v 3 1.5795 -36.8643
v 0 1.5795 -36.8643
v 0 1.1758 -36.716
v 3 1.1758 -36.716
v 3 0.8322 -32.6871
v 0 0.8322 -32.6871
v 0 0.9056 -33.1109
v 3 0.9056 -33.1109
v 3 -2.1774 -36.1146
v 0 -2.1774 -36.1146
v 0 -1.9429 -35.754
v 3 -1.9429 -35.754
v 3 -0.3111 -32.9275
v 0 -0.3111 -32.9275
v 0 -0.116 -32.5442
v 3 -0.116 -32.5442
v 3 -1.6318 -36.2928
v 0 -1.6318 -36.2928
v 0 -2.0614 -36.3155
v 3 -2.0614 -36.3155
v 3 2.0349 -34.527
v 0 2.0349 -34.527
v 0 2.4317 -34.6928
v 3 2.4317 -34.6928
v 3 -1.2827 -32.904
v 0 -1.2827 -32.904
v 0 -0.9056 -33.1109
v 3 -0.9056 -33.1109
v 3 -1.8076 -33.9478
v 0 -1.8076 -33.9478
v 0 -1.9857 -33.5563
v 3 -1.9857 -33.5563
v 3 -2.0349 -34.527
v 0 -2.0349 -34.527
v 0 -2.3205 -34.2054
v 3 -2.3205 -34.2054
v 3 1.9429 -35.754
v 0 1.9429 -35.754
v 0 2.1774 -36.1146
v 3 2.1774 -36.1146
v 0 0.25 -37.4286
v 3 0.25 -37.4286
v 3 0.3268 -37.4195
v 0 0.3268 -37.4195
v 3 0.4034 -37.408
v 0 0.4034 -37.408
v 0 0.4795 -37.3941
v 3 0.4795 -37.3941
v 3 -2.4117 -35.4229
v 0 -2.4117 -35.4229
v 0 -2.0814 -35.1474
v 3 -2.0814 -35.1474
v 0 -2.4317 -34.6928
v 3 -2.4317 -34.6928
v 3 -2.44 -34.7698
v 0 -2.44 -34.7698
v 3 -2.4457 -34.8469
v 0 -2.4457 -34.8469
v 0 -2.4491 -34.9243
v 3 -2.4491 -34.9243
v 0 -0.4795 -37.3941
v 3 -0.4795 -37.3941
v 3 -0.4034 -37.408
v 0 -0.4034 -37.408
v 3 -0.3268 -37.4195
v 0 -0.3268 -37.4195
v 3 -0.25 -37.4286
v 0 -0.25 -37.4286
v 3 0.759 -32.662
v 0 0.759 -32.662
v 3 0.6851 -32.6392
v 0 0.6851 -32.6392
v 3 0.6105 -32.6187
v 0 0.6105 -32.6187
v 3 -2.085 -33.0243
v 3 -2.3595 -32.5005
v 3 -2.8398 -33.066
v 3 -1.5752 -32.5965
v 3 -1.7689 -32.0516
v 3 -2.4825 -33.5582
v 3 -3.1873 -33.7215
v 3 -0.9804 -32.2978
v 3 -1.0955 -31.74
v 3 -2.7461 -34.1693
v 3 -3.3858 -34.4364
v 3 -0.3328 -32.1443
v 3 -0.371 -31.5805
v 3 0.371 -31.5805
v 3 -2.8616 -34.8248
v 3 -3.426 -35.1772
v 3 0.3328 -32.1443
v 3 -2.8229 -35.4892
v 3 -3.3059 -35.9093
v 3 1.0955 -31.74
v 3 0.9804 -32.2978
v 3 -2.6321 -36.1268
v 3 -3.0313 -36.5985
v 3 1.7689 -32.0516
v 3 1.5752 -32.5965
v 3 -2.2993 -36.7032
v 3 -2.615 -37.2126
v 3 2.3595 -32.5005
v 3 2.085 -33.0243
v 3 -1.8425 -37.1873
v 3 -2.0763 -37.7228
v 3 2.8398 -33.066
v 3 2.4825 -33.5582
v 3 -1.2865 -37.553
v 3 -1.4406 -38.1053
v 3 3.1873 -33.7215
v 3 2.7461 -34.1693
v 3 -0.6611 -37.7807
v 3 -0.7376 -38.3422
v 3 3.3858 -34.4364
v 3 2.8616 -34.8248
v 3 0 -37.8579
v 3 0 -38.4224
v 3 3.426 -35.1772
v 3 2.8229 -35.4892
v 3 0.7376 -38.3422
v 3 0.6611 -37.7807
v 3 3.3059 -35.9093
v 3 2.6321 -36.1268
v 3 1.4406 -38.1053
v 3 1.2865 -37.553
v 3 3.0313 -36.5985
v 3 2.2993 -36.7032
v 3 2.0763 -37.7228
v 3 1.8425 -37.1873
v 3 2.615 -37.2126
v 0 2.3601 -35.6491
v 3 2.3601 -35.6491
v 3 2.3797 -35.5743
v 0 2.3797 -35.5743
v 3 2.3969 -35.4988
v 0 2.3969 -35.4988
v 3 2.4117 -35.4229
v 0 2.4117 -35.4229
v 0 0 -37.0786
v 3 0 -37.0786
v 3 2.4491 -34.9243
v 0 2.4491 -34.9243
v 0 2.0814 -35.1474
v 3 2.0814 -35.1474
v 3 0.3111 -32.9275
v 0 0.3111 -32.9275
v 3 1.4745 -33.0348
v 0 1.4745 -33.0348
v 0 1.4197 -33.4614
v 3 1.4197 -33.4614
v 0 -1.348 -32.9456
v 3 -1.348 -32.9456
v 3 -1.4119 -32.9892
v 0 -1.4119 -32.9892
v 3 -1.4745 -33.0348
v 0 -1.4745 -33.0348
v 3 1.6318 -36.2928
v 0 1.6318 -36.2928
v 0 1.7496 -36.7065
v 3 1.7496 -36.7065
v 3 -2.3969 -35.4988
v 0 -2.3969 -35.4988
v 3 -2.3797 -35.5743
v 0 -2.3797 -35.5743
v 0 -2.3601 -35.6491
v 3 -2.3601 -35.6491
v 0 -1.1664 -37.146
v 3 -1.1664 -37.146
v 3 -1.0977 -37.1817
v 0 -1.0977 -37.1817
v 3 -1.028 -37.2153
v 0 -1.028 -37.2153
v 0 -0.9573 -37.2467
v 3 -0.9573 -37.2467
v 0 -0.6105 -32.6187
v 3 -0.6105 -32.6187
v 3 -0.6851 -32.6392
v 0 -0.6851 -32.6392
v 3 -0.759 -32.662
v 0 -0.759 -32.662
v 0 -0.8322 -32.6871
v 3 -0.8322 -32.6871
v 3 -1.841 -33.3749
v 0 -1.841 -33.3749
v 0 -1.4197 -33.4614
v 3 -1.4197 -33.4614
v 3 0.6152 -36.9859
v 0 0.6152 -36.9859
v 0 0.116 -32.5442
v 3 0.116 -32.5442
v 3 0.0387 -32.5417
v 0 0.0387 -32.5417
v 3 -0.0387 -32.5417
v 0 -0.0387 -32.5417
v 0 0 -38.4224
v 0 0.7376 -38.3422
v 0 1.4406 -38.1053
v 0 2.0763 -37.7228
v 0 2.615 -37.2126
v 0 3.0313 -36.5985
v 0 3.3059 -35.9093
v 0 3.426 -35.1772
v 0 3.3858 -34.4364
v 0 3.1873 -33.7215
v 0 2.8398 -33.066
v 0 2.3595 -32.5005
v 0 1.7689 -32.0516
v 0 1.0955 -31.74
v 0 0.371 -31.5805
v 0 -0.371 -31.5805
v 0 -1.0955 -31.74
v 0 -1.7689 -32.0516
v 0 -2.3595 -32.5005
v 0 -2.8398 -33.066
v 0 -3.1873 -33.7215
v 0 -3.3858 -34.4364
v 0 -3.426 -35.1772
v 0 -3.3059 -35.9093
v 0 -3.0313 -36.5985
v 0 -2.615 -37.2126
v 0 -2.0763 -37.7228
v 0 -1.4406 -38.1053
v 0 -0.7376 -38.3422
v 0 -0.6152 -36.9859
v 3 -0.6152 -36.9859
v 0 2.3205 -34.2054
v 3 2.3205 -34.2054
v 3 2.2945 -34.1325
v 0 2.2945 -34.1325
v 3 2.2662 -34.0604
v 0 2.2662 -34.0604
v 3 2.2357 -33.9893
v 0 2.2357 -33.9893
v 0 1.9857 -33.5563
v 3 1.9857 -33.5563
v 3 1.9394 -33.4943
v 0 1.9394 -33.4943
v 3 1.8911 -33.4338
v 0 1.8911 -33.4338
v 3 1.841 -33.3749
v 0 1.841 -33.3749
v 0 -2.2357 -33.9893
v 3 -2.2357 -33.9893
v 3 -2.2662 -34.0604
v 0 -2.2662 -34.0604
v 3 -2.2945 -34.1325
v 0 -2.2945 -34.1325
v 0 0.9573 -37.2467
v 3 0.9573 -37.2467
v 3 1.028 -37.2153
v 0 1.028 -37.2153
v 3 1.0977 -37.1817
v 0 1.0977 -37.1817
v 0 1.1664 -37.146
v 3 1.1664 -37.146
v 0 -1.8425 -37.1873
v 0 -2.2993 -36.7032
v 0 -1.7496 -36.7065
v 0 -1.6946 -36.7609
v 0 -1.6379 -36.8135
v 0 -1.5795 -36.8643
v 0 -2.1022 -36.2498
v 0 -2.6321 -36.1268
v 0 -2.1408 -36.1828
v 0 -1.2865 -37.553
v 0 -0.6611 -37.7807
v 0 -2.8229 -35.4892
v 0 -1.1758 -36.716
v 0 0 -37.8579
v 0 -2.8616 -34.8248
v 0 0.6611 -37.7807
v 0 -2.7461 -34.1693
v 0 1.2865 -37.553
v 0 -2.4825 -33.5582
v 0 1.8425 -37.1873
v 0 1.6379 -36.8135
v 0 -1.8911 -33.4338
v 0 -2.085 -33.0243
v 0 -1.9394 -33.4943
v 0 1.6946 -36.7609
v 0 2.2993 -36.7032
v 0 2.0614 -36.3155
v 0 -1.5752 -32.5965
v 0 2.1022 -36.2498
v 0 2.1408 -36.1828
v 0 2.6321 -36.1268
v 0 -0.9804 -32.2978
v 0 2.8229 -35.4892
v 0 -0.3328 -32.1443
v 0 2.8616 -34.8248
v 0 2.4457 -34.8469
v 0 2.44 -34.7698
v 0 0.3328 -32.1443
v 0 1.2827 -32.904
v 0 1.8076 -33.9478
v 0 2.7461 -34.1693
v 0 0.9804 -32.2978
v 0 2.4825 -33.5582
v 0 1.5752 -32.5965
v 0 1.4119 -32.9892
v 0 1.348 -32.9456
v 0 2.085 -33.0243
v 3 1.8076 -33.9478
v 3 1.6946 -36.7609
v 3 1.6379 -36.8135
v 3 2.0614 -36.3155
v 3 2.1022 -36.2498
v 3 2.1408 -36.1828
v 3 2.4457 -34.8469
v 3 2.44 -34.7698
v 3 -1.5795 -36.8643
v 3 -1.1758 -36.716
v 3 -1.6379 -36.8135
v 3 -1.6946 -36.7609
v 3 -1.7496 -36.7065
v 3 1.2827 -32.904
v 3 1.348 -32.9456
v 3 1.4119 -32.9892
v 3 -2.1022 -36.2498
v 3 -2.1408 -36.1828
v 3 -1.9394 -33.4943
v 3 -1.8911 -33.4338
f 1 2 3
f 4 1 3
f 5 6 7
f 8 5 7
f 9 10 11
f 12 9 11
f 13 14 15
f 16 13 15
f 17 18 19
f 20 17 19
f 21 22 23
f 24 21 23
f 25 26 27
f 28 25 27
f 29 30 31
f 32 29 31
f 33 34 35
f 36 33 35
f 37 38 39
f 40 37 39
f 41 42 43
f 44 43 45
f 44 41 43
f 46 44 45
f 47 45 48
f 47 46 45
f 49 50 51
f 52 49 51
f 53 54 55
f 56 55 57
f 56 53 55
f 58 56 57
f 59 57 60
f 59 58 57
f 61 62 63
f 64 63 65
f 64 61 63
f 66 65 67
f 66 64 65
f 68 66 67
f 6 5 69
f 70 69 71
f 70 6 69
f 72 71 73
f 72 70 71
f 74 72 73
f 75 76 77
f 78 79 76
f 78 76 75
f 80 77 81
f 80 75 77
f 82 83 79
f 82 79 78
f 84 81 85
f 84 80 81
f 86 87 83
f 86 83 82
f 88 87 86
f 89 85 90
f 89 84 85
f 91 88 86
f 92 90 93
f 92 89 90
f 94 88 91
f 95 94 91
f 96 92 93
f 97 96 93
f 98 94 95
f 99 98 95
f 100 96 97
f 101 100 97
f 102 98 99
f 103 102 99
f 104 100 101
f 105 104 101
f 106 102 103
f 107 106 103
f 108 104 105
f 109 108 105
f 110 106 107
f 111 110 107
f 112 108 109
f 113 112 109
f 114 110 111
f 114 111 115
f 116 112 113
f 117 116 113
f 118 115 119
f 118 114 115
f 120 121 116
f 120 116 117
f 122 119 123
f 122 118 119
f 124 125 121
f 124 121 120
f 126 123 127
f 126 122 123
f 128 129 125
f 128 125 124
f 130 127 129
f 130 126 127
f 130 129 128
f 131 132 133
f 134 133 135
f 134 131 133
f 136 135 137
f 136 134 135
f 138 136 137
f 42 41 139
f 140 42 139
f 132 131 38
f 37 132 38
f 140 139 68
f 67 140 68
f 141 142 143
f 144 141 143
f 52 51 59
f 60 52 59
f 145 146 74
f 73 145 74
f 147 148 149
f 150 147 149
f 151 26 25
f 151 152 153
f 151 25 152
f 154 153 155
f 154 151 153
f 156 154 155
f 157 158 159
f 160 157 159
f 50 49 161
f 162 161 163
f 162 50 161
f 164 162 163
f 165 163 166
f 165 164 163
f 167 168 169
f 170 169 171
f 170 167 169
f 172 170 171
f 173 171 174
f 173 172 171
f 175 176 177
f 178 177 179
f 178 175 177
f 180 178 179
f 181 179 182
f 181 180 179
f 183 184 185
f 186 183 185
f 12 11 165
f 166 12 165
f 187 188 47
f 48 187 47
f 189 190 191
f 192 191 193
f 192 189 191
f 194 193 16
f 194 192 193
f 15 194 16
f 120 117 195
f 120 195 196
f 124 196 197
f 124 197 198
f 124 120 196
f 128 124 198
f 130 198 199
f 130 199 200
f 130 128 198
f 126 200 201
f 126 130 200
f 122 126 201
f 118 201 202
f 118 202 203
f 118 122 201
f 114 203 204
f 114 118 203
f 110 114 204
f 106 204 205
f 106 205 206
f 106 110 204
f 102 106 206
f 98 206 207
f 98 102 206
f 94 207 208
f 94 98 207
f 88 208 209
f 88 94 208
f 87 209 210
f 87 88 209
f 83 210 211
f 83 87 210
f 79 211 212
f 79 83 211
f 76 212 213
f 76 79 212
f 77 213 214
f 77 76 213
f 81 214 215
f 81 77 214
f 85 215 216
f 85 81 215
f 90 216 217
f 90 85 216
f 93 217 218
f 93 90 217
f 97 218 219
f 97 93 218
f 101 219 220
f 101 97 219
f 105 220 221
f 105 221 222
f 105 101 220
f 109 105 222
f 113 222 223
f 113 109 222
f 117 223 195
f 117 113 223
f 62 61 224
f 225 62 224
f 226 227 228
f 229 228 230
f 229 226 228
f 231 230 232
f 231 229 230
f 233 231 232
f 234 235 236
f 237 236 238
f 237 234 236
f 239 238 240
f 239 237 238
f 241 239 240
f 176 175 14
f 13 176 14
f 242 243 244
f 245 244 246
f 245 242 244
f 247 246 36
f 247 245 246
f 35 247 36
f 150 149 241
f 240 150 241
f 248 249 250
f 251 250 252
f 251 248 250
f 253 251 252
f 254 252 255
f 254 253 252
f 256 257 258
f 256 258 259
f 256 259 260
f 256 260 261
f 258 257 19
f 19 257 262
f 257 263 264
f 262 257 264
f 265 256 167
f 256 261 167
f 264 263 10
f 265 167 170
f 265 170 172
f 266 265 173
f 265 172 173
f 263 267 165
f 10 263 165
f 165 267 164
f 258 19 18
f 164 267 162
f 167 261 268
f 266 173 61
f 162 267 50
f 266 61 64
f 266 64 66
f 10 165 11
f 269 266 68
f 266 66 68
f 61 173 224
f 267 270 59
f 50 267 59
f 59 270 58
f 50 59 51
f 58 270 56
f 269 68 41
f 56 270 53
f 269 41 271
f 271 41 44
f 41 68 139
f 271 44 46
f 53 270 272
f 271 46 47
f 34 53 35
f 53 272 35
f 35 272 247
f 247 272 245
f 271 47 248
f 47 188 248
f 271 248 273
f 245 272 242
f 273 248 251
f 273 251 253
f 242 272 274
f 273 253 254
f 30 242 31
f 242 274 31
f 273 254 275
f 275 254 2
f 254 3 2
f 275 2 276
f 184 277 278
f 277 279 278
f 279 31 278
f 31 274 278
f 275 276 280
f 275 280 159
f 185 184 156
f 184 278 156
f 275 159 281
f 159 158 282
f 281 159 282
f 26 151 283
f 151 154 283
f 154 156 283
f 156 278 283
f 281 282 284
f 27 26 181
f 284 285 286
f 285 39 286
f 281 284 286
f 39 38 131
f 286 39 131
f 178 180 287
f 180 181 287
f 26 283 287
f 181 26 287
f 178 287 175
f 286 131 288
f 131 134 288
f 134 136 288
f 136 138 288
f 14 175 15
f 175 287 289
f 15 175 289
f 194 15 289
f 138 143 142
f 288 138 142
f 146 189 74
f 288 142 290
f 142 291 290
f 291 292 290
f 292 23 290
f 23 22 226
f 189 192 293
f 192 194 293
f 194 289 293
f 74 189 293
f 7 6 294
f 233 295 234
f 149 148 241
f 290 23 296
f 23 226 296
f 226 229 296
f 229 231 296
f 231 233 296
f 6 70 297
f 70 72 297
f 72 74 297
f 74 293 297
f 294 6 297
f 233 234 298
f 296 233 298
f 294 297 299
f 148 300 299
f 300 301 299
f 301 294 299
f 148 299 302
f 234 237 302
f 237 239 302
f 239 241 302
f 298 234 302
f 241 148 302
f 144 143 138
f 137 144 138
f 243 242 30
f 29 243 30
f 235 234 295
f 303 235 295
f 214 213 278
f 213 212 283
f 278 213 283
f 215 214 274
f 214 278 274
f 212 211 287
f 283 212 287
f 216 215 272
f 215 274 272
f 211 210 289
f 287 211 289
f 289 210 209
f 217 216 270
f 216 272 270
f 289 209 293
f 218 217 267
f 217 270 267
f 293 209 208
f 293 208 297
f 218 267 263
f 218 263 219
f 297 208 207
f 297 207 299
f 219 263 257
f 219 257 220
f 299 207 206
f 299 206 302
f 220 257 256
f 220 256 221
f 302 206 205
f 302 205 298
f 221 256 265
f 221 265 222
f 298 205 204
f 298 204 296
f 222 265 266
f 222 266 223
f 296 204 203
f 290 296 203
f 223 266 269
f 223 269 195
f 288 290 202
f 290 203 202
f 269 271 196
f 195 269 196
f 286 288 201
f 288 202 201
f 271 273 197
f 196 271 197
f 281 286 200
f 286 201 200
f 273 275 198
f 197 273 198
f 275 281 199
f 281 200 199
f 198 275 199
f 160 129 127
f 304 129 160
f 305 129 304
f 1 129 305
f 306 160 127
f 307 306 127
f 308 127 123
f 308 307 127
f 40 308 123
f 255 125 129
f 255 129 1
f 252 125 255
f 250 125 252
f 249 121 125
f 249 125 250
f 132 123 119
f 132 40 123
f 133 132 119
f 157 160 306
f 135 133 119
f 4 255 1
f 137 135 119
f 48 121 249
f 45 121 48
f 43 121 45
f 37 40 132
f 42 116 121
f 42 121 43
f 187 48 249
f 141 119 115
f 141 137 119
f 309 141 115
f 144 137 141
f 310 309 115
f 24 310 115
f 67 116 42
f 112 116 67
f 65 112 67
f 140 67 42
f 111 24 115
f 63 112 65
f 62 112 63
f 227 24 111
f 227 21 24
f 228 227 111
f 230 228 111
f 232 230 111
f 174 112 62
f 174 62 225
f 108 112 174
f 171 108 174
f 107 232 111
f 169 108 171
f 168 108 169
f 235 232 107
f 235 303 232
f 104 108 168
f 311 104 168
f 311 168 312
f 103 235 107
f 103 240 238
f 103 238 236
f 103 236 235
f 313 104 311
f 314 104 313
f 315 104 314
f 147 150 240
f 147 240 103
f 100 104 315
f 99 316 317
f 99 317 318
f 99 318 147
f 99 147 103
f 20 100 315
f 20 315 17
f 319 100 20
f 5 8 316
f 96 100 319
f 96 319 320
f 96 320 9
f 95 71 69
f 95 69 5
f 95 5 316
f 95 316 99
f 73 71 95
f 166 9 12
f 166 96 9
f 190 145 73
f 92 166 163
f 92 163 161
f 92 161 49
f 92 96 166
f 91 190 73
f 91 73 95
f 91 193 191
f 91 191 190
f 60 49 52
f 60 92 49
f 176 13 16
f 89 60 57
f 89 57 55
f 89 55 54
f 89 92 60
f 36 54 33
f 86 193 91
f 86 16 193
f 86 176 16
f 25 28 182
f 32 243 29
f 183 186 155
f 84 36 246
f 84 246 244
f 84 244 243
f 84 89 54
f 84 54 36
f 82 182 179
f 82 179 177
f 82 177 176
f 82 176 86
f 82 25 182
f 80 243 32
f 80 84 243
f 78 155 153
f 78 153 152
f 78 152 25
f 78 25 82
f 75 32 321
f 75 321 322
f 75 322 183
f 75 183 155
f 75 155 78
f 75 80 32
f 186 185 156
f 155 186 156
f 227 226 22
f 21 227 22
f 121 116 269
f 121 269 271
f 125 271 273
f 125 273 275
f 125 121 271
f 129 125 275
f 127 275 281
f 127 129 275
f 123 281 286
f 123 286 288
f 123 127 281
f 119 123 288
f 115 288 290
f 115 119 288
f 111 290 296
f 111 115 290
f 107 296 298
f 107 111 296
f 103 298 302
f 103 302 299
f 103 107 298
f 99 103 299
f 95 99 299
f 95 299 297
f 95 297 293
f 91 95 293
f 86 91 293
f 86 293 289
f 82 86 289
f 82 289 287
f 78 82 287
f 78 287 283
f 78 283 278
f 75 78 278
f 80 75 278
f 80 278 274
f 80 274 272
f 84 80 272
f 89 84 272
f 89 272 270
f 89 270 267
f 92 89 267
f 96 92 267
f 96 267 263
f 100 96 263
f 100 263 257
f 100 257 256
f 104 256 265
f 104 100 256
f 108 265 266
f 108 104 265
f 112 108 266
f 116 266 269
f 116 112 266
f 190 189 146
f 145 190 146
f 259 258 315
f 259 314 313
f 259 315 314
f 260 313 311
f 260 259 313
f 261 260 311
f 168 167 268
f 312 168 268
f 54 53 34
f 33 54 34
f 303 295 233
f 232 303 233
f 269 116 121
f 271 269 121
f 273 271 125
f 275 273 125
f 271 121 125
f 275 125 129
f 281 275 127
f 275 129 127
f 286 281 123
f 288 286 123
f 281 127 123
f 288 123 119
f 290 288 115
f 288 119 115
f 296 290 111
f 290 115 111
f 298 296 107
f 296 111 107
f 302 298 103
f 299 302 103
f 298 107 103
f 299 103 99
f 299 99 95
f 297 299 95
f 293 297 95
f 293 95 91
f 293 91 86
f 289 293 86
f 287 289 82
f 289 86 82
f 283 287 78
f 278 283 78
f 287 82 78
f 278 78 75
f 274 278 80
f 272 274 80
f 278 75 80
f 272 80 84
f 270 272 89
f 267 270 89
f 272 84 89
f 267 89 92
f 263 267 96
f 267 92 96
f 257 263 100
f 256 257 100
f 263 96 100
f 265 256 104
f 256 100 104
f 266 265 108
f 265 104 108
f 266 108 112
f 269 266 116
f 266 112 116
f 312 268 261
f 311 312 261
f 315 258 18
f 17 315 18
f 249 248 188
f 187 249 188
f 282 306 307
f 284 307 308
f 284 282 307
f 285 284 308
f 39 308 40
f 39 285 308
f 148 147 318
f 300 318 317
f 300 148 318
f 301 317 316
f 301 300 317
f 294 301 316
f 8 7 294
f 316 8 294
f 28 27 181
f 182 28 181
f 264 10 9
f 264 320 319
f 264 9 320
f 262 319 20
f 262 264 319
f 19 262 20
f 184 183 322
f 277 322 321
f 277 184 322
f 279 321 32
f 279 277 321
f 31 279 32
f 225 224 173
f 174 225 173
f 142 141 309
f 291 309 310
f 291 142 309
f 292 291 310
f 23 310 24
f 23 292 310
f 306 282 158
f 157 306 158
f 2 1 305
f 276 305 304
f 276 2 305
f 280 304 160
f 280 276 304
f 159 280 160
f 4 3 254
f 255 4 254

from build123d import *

# Parameters (mm, degrees)
EXTRUDE_1_OUTLINE_R      = 2.45
EXTRUDE_1_DEPTH          = 3
EXTRUDE_2_DEPTH          = 3
PATTERN_CIRCULAR_1_COUNT = 21
SKETCH2_R                = 8.547586549
SKETCH2_R_2              = 3.001513839
CUT_EXTRUDE1_DEPTH       = 10
BOSS_EXTRUDE1_DEPTH      = 3
CIRPATTERN6_COUNT        = 22
CIRPATTERN6_ANGLE        = 345.24
SKETCH_2_R               = 4.158407847
SKETCH_2_R_2             = 2.866491316
CUT_EXTRUDE_1_DEPTH      = 10
SKETCH_3_R               = 3.430993381
SKETCH_3_R_2             = 2.866491316
EXTRUDE_3_DEPTH          = 3


# Read off the part's stored shape, not the designer's step: Бобышка-Вытянуть1, Бобышка-Вытянуть2
with BuildPart() as part:
    # Бобышка-Вытянуть1 outline → Бобышка-Вытянуть1 (new body)
    with BuildSketch(Plane.YZ):
        with BuildLine():
            ThreePointArc((7.60775827, -34.09831761), (6.73424843, -33.630363316), (5.760344946, -33.44729867))
            add(Edge.make_bspline(
                [(5.760344946, -33.44729867), (5.46713328, -33.652163863), (5.029274696, -33.876555627), (4.421054767, -33.805447152), (4.212742264, -33.546022471), (4.096748531, -33.239168782), (3.977348555, -32.974896207), (3.887120883, -32.809203227), (3.860215155, -32.76273366)],
                knots=[0, 0, 0, 0, 0.384536387, 0.512259949, 0.613992842, 0.721907854, 0.866992584, 0.924751204, 0.924751204, 0.924751204, 0.924751204], degree=3))
            add(Edge.make_bspline(
                [(4.213382498, -30.770846655), (3.889503683, -30.922653577), (3.476501747, -31.190050668), (3.234513044, -31.752571214), (3.355322595, -32.062571724), (3.563312271, -32.31625268), (3.733540633, -32.552791241), (3.832728628, -32.714954029), (3.860215155, -32.76273366)],
                knots=[0, 0, 0, 0, 0.384536387, 0.512259949, 0.613992842, 0.721907854, 0.866992584, 0.926284353, 0.926284353, 0.926284353, 0.926284353], degree=3))
            ThreePointArc((4.213382498, -30.770846655), (4.540898548, -29.835574557), (4.571443, -28.845085941))
            ThreePointArc((4.571443, -28.845085941), (3.833465447, -28.344311993), (3.030421179, -27.956361842))
            ThreePointArc((3.030421179, -27.956361842), (2.188405953, -28.478866407), (1.542915576, -29.230759241))
            add(Edge.make_bspline(
                [(1.542915576, -29.230759241), (1.573728205, -29.587120589), (1.549127882, -30.078513128), (1.183436171, -30.5696928), (0.854611556, -30.620384379), (0.530871599, -30.567411055), (0.242304847, -30.538678179), (0.053696682, -30.533971145), (-8e-09, -30.534037406)],
                knots=[0, 0, 0, 0, 0.384536387, 0.512259949, 0.613992842, 0.721907854, 0.866992584, 0.924751204, 0.924751204, 0.924751204, 0.924751204], degree=3))
            add(Edge.make_bspline(
                [(-1.548441084, -29.232242013), (-1.578911841, -29.588632755), (-1.553840136, -30.080001469), (-1.187677404, -30.570830107), (-0.858804311, -30.621206221), (-0.535115321, -30.567922356), (-0.245152737, -30.53876955), (-0.055121646, -30.533951621), (-8e-09, -30.534037406)],
                knots=[0, 0, 0, 0, 0.384536387, 0.512259949, 0.613992842, 0.721907854, 0.866992584, 0.926284353, 0.926284353, 0.926284353, 0.926284353], degree=3))
            ThreePointArc((-1.548441084, -29.232242013), (-2.194652456, -28.480968744), (-3.037168533, -27.959272165))
            ThreePointArc((-3.037168533, -27.959272165), (-3.839840271, -28.347992499), (-4.577337091, -28.84947416))
            ThreePointArc((-4.577337091, -28.84947416), (-4.545842477, -29.839933019), (-4.217429369, -30.7748905))
            add(Edge.make_bspline(
                [(-4.217429369, -30.7748905), (-3.893405075, -30.926386654), (-3.480146815, -31.193387429), (-3.237618596, -31.755675577), (-3.358130708, -32.065791836), (-3.565876932, -32.3196722), (-3.735043708, -32.5552119), (-3.833424202, -32.716197846), (-3.860215162, -32.762733674)],
                knots=[0, 0, 0, 0, 0.384536387, 0.512259949, 0.613992842, 0.721907854, 0.866992584, 0.924751204, 0.924751204, 0.924751204, 0.924751204], degree=3))
            add(Edge.make_bspline(
                [(-5.761823582, -33.452825286), (-5.468415524, -33.657409106), (-5.030341882, -33.881380729), (-4.422190447, -33.80968882), (-4.214126907, -33.550064425), (-4.098427592, -33.243099604), (-3.978693371, -32.977408237), (-3.887850274, -32.81042752), (-3.860215162, -32.762733674)],
                knots=[0, 0, 0, 0, 0.384536387, 0.512259949, 0.613992842, 0.721907854, 0.866992584, 0.926284353, 0.926284353, 0.926284353, 0.926284353], degree=3))
            ThreePointArc((-5.761823582, -33.452825286), (-6.735551004, -33.636824115), (-7.608611533, -34.105616152))
            ThreePointArc((-7.608611533, -34.105616152), (-7.673305717, -34.995110434), (-7.60775827, -35.884542246))
            ThreePointArc((-7.60775827, -35.884542246), (-6.73424843, -36.35249654), (-5.760344946, -36.535561187))
            add(Edge.make_bspline(
                [(-5.760344946, -36.535561187), (-5.46713328, -36.330695993), (-5.029274696, -36.106304229), (-4.421054767, -36.177412704), (-4.212742264, -36.436837385), (-4.096748531, -36.743691074), (-3.977348555, -37.007963649), (-3.887120883, -37.173656629), (-3.860215155, -37.220126196)],
                knots=[0, 0, 0, 0, 0.384536387, 0.512259949, 0.613992842, 0.721907854, 0.866992584, 0.924751204, 0.924751204, 0.924751204, 0.924751204], degree=3))
            add(Edge.make_bspline(
                [(-4.213382498, -39.212013201), (-3.889503683, -39.060206279), (-3.476501747, -38.792809189), (-3.234513044, -38.230288642), (-3.355322595, -37.920288132), (-3.563312271, -37.666607177), (-3.733540633, -37.430068615), (-3.832728628, -37.267905828), (-3.860215155, -37.220126196)],
                knots=[0, 0, 0, 0, 0.384536387, 0.512259949, 0.613992842, 0.721907854, 0.866992584, 0.926284353, 0.926284353, 0.926284353, 0.926284353], degree=3))
            ThreePointArc((-4.213382498, -39.212013201), (-4.540898548, -40.147285299), (-4.571443, -41.137773915))
            ThreePointArc((-4.571443, -41.137773915), (-3.833465447, -41.638547863), (-3.030421179, -42.026498015))
            ThreePointArc((-3.030421179, -42.026498015), (-2.188405953, -41.503993449), (-1.542915576, -40.752100615))
            add(Edge.make_bspline(
                [(-1.542915576, -40.752100615), (-1.573728205, -40.395739267), (-1.549127882, -39.904346728), (-1.183436171, -39.413167056), (-0.854611556, -39.362475477), (-0.530871599, -39.415448802), (-0.242304847, -39.444181677), (-0.053696682, -39.448888711), (8e-09, -39.44882245)],
                knots=[0, 0, 0, 0, 0.384536387, 0.512259949, 0.613992842, 0.721907854, 0.866992584, 0.924751204, 0.924751204, 0.924751204, 0.924751204], degree=3))
            add(Edge.make_bspline(
                [(1.548441084, -40.750617843), (1.578911841, -40.394227101), (1.553840136, -39.902858387), (1.187677404, -39.41202975), (0.858804311, -39.361653636), (0.535115321, -39.4149375), (0.245152737, -39.444090306), (0.055121646, -39.448908236), (8e-09, -39.44882245)],
                knots=[0, 0, 0, 0, 0.384536387, 0.512259949, 0.613992842, 0.721907854, 0.866992584, 0.926284353, 0.926284353, 0.926284353, 0.926284353], degree=3))
            ThreePointArc((1.548441084, -40.750617843), (2.194652456, -41.501891112), (3.037168533, -42.023587691))
            ThreePointArc((3.037168533, -42.023587691), (3.839840271, -41.634867357), (4.577337091, -41.133385696))
            ThreePointArc((4.577337091, -41.133385696), (4.545842477, -40.142926837), (4.217429369, -39.207969356))
            add(Edge.make_bspline(
                [(4.217429369, -39.207969356), (3.893405075, -39.056473202), (3.480146815, -38.789472427), (3.237618596, -38.22718428), (3.358130708, -37.91706802), (3.565876932, -37.663187656), (3.735878304, -37.426485903), (3.834910691, -37.264228039), (3.862345998, -37.216418958)],
                knots=[0, 0, 0, 0, 0.384536387, 0.512259949, 0.613992842, 0.721907854, 0.866992584, 0.926284353, 0.926284353, 0.926284353, 0.926284353], degree=3))
            add(Edge.make_bspline(
                [(5.761823582, -36.53003457), (5.468415524, -36.32545075), (5.030341882, -36.101479127), (4.422190447, -36.173171036), (4.214126907, -36.432795431), (4.098427592, -36.739760252), (3.979281188, -37.004147246), (3.889212507, -37.169926706), (3.862345998, -37.216418958)],
                knots=[0, 0, 0, 0, 0.384536387, 0.512259949, 0.613992842, 0.721907854, 0.866992584, 0.924751204, 0.924751204, 0.924751204, 0.924751204], degree=3))
            ThreePointArc((5.761823582, -36.53003457), (6.735551004, -36.346035741), (7.608611533, -35.877243704))
            ThreePointArc((7.608611533, -35.877243704), (7.673305717, -34.987749422), (7.60775827, -34.09831761))
        make_face()
        with Locations((0, -34.991429928)):
            Circle(EXTRUDE_1_OUTLINE_R, mode=Mode.SUBTRACT)
    extrude(amount=EXTRUDE_1_DEPTH)

    # Бобышка-Вытянуть2 outline → Бобышка-Вытянуть2 (add)
    with BuildSketch(Plane.YZ):
        with BuildLine():
            Line((0.25, -37.428641449), (0, -37.078641449))
            Line((0, -37.078641449), (-0.25, -37.428641449))
            ThreePointArc((-0.25, -37.428641449), (0, -37.441429928), (0.25, -37.428641449))
        make_face()
    extrude_2 = extrude(amount=EXTRUDE_2_DEPTH)

    # Круговой массив1: Бобышка-Вытянуть2 ×21 about axis
    pattern_circular_1_axis = Axis((0, 0, -34.991429928), (1, 0, 0))
    for i in range(1, PATTERN_CIRCULAR_1_COUNT):
        add(extrude_2.rotate(pattern_circular_1_axis, i * 360 / PATTERN_CIRCULAR_1_COUNT))

    # Sketch2 → Cut-Extrude1 (cut)
    with BuildSketch(Plane(origin=(3, 0, 0), x_dir=(0, 0, -1), z_dir=(1, 0, 0))):
        with Locations((34.991429928, 0)):
            Circle(SKETCH2_R)
        with Locations((34.991429928, 0)):
            Circle(SKETCH2_R_2, mode=Mode.SUBTRACT)
    extrude(amount=-CUT_EXTRUDE1_DEPTH, mode=Mode.SUBTRACT)

    # Sketch3 → Boss-Extrude1 (add)
    with BuildSketch(Plane(origin=(3, 0, 0), x_dir=(0, 0, -1), z_dir=(1, 0, 0))):
        Polygon((32.116918179, 0.398551141), (31.120540325, 0), (32.116918179, -0.398551141), (32.116918179, -0.001448859), (32.116918179, 0.001448859), align=None)
    boss_extrude1 = extrude(amount=-BOSS_EXTRUDE1_DEPTH)

    # CirPattern6: Boss-Extrude1 ×22 about axis
    cirpattern6_axis = Axis((0, 0, -34.991429928), (1, 0, 0))
    for i in range(1, CIRPATTERN6_COUNT):
        add(boss_extrude1.rotate(cirpattern6_axis, i * CIRPATTERN6_ANGLE / (CIRPATTERN6_COUNT - 1)))

    # Эскиз2 → Вырез-Вытянуть1 (cut)
    with BuildSketch(Plane(origin=(3, 0, 0), x_dir=(0, 0, -1), z_dir=(1, 0, 0))):
        with Locations((34.991429928, 0)):
            Circle(SKETCH_2_R)
        with Locations((34.991429928, 0)):
            Circle(SKETCH_2_R_2, mode=Mode.SUBTRACT)
    extrude(amount=-CUT_EXTRUDE_1_DEPTH, mode=Mode.SUBTRACT)


with BuildPart() as body_2:
    # Эскиз3 → Бобышка-Вытянуть3 (new body)
    with BuildSketch(Plane(origin=(3, 0, 0), x_dir=(0, 0, -1), z_dir=(1, 0, 0))):
        with Locations((34.991429928, 0)):
            Circle(SKETCH_3_R)
        with Locations((34.991429928, 0)):
            Circle(SKETCH_3_R_2, mode=Mode.SUBTRACT)
    extrude(amount=-EXTRUDE_3_DEPTH)


solid = Compound([part.part, body_2.part])
